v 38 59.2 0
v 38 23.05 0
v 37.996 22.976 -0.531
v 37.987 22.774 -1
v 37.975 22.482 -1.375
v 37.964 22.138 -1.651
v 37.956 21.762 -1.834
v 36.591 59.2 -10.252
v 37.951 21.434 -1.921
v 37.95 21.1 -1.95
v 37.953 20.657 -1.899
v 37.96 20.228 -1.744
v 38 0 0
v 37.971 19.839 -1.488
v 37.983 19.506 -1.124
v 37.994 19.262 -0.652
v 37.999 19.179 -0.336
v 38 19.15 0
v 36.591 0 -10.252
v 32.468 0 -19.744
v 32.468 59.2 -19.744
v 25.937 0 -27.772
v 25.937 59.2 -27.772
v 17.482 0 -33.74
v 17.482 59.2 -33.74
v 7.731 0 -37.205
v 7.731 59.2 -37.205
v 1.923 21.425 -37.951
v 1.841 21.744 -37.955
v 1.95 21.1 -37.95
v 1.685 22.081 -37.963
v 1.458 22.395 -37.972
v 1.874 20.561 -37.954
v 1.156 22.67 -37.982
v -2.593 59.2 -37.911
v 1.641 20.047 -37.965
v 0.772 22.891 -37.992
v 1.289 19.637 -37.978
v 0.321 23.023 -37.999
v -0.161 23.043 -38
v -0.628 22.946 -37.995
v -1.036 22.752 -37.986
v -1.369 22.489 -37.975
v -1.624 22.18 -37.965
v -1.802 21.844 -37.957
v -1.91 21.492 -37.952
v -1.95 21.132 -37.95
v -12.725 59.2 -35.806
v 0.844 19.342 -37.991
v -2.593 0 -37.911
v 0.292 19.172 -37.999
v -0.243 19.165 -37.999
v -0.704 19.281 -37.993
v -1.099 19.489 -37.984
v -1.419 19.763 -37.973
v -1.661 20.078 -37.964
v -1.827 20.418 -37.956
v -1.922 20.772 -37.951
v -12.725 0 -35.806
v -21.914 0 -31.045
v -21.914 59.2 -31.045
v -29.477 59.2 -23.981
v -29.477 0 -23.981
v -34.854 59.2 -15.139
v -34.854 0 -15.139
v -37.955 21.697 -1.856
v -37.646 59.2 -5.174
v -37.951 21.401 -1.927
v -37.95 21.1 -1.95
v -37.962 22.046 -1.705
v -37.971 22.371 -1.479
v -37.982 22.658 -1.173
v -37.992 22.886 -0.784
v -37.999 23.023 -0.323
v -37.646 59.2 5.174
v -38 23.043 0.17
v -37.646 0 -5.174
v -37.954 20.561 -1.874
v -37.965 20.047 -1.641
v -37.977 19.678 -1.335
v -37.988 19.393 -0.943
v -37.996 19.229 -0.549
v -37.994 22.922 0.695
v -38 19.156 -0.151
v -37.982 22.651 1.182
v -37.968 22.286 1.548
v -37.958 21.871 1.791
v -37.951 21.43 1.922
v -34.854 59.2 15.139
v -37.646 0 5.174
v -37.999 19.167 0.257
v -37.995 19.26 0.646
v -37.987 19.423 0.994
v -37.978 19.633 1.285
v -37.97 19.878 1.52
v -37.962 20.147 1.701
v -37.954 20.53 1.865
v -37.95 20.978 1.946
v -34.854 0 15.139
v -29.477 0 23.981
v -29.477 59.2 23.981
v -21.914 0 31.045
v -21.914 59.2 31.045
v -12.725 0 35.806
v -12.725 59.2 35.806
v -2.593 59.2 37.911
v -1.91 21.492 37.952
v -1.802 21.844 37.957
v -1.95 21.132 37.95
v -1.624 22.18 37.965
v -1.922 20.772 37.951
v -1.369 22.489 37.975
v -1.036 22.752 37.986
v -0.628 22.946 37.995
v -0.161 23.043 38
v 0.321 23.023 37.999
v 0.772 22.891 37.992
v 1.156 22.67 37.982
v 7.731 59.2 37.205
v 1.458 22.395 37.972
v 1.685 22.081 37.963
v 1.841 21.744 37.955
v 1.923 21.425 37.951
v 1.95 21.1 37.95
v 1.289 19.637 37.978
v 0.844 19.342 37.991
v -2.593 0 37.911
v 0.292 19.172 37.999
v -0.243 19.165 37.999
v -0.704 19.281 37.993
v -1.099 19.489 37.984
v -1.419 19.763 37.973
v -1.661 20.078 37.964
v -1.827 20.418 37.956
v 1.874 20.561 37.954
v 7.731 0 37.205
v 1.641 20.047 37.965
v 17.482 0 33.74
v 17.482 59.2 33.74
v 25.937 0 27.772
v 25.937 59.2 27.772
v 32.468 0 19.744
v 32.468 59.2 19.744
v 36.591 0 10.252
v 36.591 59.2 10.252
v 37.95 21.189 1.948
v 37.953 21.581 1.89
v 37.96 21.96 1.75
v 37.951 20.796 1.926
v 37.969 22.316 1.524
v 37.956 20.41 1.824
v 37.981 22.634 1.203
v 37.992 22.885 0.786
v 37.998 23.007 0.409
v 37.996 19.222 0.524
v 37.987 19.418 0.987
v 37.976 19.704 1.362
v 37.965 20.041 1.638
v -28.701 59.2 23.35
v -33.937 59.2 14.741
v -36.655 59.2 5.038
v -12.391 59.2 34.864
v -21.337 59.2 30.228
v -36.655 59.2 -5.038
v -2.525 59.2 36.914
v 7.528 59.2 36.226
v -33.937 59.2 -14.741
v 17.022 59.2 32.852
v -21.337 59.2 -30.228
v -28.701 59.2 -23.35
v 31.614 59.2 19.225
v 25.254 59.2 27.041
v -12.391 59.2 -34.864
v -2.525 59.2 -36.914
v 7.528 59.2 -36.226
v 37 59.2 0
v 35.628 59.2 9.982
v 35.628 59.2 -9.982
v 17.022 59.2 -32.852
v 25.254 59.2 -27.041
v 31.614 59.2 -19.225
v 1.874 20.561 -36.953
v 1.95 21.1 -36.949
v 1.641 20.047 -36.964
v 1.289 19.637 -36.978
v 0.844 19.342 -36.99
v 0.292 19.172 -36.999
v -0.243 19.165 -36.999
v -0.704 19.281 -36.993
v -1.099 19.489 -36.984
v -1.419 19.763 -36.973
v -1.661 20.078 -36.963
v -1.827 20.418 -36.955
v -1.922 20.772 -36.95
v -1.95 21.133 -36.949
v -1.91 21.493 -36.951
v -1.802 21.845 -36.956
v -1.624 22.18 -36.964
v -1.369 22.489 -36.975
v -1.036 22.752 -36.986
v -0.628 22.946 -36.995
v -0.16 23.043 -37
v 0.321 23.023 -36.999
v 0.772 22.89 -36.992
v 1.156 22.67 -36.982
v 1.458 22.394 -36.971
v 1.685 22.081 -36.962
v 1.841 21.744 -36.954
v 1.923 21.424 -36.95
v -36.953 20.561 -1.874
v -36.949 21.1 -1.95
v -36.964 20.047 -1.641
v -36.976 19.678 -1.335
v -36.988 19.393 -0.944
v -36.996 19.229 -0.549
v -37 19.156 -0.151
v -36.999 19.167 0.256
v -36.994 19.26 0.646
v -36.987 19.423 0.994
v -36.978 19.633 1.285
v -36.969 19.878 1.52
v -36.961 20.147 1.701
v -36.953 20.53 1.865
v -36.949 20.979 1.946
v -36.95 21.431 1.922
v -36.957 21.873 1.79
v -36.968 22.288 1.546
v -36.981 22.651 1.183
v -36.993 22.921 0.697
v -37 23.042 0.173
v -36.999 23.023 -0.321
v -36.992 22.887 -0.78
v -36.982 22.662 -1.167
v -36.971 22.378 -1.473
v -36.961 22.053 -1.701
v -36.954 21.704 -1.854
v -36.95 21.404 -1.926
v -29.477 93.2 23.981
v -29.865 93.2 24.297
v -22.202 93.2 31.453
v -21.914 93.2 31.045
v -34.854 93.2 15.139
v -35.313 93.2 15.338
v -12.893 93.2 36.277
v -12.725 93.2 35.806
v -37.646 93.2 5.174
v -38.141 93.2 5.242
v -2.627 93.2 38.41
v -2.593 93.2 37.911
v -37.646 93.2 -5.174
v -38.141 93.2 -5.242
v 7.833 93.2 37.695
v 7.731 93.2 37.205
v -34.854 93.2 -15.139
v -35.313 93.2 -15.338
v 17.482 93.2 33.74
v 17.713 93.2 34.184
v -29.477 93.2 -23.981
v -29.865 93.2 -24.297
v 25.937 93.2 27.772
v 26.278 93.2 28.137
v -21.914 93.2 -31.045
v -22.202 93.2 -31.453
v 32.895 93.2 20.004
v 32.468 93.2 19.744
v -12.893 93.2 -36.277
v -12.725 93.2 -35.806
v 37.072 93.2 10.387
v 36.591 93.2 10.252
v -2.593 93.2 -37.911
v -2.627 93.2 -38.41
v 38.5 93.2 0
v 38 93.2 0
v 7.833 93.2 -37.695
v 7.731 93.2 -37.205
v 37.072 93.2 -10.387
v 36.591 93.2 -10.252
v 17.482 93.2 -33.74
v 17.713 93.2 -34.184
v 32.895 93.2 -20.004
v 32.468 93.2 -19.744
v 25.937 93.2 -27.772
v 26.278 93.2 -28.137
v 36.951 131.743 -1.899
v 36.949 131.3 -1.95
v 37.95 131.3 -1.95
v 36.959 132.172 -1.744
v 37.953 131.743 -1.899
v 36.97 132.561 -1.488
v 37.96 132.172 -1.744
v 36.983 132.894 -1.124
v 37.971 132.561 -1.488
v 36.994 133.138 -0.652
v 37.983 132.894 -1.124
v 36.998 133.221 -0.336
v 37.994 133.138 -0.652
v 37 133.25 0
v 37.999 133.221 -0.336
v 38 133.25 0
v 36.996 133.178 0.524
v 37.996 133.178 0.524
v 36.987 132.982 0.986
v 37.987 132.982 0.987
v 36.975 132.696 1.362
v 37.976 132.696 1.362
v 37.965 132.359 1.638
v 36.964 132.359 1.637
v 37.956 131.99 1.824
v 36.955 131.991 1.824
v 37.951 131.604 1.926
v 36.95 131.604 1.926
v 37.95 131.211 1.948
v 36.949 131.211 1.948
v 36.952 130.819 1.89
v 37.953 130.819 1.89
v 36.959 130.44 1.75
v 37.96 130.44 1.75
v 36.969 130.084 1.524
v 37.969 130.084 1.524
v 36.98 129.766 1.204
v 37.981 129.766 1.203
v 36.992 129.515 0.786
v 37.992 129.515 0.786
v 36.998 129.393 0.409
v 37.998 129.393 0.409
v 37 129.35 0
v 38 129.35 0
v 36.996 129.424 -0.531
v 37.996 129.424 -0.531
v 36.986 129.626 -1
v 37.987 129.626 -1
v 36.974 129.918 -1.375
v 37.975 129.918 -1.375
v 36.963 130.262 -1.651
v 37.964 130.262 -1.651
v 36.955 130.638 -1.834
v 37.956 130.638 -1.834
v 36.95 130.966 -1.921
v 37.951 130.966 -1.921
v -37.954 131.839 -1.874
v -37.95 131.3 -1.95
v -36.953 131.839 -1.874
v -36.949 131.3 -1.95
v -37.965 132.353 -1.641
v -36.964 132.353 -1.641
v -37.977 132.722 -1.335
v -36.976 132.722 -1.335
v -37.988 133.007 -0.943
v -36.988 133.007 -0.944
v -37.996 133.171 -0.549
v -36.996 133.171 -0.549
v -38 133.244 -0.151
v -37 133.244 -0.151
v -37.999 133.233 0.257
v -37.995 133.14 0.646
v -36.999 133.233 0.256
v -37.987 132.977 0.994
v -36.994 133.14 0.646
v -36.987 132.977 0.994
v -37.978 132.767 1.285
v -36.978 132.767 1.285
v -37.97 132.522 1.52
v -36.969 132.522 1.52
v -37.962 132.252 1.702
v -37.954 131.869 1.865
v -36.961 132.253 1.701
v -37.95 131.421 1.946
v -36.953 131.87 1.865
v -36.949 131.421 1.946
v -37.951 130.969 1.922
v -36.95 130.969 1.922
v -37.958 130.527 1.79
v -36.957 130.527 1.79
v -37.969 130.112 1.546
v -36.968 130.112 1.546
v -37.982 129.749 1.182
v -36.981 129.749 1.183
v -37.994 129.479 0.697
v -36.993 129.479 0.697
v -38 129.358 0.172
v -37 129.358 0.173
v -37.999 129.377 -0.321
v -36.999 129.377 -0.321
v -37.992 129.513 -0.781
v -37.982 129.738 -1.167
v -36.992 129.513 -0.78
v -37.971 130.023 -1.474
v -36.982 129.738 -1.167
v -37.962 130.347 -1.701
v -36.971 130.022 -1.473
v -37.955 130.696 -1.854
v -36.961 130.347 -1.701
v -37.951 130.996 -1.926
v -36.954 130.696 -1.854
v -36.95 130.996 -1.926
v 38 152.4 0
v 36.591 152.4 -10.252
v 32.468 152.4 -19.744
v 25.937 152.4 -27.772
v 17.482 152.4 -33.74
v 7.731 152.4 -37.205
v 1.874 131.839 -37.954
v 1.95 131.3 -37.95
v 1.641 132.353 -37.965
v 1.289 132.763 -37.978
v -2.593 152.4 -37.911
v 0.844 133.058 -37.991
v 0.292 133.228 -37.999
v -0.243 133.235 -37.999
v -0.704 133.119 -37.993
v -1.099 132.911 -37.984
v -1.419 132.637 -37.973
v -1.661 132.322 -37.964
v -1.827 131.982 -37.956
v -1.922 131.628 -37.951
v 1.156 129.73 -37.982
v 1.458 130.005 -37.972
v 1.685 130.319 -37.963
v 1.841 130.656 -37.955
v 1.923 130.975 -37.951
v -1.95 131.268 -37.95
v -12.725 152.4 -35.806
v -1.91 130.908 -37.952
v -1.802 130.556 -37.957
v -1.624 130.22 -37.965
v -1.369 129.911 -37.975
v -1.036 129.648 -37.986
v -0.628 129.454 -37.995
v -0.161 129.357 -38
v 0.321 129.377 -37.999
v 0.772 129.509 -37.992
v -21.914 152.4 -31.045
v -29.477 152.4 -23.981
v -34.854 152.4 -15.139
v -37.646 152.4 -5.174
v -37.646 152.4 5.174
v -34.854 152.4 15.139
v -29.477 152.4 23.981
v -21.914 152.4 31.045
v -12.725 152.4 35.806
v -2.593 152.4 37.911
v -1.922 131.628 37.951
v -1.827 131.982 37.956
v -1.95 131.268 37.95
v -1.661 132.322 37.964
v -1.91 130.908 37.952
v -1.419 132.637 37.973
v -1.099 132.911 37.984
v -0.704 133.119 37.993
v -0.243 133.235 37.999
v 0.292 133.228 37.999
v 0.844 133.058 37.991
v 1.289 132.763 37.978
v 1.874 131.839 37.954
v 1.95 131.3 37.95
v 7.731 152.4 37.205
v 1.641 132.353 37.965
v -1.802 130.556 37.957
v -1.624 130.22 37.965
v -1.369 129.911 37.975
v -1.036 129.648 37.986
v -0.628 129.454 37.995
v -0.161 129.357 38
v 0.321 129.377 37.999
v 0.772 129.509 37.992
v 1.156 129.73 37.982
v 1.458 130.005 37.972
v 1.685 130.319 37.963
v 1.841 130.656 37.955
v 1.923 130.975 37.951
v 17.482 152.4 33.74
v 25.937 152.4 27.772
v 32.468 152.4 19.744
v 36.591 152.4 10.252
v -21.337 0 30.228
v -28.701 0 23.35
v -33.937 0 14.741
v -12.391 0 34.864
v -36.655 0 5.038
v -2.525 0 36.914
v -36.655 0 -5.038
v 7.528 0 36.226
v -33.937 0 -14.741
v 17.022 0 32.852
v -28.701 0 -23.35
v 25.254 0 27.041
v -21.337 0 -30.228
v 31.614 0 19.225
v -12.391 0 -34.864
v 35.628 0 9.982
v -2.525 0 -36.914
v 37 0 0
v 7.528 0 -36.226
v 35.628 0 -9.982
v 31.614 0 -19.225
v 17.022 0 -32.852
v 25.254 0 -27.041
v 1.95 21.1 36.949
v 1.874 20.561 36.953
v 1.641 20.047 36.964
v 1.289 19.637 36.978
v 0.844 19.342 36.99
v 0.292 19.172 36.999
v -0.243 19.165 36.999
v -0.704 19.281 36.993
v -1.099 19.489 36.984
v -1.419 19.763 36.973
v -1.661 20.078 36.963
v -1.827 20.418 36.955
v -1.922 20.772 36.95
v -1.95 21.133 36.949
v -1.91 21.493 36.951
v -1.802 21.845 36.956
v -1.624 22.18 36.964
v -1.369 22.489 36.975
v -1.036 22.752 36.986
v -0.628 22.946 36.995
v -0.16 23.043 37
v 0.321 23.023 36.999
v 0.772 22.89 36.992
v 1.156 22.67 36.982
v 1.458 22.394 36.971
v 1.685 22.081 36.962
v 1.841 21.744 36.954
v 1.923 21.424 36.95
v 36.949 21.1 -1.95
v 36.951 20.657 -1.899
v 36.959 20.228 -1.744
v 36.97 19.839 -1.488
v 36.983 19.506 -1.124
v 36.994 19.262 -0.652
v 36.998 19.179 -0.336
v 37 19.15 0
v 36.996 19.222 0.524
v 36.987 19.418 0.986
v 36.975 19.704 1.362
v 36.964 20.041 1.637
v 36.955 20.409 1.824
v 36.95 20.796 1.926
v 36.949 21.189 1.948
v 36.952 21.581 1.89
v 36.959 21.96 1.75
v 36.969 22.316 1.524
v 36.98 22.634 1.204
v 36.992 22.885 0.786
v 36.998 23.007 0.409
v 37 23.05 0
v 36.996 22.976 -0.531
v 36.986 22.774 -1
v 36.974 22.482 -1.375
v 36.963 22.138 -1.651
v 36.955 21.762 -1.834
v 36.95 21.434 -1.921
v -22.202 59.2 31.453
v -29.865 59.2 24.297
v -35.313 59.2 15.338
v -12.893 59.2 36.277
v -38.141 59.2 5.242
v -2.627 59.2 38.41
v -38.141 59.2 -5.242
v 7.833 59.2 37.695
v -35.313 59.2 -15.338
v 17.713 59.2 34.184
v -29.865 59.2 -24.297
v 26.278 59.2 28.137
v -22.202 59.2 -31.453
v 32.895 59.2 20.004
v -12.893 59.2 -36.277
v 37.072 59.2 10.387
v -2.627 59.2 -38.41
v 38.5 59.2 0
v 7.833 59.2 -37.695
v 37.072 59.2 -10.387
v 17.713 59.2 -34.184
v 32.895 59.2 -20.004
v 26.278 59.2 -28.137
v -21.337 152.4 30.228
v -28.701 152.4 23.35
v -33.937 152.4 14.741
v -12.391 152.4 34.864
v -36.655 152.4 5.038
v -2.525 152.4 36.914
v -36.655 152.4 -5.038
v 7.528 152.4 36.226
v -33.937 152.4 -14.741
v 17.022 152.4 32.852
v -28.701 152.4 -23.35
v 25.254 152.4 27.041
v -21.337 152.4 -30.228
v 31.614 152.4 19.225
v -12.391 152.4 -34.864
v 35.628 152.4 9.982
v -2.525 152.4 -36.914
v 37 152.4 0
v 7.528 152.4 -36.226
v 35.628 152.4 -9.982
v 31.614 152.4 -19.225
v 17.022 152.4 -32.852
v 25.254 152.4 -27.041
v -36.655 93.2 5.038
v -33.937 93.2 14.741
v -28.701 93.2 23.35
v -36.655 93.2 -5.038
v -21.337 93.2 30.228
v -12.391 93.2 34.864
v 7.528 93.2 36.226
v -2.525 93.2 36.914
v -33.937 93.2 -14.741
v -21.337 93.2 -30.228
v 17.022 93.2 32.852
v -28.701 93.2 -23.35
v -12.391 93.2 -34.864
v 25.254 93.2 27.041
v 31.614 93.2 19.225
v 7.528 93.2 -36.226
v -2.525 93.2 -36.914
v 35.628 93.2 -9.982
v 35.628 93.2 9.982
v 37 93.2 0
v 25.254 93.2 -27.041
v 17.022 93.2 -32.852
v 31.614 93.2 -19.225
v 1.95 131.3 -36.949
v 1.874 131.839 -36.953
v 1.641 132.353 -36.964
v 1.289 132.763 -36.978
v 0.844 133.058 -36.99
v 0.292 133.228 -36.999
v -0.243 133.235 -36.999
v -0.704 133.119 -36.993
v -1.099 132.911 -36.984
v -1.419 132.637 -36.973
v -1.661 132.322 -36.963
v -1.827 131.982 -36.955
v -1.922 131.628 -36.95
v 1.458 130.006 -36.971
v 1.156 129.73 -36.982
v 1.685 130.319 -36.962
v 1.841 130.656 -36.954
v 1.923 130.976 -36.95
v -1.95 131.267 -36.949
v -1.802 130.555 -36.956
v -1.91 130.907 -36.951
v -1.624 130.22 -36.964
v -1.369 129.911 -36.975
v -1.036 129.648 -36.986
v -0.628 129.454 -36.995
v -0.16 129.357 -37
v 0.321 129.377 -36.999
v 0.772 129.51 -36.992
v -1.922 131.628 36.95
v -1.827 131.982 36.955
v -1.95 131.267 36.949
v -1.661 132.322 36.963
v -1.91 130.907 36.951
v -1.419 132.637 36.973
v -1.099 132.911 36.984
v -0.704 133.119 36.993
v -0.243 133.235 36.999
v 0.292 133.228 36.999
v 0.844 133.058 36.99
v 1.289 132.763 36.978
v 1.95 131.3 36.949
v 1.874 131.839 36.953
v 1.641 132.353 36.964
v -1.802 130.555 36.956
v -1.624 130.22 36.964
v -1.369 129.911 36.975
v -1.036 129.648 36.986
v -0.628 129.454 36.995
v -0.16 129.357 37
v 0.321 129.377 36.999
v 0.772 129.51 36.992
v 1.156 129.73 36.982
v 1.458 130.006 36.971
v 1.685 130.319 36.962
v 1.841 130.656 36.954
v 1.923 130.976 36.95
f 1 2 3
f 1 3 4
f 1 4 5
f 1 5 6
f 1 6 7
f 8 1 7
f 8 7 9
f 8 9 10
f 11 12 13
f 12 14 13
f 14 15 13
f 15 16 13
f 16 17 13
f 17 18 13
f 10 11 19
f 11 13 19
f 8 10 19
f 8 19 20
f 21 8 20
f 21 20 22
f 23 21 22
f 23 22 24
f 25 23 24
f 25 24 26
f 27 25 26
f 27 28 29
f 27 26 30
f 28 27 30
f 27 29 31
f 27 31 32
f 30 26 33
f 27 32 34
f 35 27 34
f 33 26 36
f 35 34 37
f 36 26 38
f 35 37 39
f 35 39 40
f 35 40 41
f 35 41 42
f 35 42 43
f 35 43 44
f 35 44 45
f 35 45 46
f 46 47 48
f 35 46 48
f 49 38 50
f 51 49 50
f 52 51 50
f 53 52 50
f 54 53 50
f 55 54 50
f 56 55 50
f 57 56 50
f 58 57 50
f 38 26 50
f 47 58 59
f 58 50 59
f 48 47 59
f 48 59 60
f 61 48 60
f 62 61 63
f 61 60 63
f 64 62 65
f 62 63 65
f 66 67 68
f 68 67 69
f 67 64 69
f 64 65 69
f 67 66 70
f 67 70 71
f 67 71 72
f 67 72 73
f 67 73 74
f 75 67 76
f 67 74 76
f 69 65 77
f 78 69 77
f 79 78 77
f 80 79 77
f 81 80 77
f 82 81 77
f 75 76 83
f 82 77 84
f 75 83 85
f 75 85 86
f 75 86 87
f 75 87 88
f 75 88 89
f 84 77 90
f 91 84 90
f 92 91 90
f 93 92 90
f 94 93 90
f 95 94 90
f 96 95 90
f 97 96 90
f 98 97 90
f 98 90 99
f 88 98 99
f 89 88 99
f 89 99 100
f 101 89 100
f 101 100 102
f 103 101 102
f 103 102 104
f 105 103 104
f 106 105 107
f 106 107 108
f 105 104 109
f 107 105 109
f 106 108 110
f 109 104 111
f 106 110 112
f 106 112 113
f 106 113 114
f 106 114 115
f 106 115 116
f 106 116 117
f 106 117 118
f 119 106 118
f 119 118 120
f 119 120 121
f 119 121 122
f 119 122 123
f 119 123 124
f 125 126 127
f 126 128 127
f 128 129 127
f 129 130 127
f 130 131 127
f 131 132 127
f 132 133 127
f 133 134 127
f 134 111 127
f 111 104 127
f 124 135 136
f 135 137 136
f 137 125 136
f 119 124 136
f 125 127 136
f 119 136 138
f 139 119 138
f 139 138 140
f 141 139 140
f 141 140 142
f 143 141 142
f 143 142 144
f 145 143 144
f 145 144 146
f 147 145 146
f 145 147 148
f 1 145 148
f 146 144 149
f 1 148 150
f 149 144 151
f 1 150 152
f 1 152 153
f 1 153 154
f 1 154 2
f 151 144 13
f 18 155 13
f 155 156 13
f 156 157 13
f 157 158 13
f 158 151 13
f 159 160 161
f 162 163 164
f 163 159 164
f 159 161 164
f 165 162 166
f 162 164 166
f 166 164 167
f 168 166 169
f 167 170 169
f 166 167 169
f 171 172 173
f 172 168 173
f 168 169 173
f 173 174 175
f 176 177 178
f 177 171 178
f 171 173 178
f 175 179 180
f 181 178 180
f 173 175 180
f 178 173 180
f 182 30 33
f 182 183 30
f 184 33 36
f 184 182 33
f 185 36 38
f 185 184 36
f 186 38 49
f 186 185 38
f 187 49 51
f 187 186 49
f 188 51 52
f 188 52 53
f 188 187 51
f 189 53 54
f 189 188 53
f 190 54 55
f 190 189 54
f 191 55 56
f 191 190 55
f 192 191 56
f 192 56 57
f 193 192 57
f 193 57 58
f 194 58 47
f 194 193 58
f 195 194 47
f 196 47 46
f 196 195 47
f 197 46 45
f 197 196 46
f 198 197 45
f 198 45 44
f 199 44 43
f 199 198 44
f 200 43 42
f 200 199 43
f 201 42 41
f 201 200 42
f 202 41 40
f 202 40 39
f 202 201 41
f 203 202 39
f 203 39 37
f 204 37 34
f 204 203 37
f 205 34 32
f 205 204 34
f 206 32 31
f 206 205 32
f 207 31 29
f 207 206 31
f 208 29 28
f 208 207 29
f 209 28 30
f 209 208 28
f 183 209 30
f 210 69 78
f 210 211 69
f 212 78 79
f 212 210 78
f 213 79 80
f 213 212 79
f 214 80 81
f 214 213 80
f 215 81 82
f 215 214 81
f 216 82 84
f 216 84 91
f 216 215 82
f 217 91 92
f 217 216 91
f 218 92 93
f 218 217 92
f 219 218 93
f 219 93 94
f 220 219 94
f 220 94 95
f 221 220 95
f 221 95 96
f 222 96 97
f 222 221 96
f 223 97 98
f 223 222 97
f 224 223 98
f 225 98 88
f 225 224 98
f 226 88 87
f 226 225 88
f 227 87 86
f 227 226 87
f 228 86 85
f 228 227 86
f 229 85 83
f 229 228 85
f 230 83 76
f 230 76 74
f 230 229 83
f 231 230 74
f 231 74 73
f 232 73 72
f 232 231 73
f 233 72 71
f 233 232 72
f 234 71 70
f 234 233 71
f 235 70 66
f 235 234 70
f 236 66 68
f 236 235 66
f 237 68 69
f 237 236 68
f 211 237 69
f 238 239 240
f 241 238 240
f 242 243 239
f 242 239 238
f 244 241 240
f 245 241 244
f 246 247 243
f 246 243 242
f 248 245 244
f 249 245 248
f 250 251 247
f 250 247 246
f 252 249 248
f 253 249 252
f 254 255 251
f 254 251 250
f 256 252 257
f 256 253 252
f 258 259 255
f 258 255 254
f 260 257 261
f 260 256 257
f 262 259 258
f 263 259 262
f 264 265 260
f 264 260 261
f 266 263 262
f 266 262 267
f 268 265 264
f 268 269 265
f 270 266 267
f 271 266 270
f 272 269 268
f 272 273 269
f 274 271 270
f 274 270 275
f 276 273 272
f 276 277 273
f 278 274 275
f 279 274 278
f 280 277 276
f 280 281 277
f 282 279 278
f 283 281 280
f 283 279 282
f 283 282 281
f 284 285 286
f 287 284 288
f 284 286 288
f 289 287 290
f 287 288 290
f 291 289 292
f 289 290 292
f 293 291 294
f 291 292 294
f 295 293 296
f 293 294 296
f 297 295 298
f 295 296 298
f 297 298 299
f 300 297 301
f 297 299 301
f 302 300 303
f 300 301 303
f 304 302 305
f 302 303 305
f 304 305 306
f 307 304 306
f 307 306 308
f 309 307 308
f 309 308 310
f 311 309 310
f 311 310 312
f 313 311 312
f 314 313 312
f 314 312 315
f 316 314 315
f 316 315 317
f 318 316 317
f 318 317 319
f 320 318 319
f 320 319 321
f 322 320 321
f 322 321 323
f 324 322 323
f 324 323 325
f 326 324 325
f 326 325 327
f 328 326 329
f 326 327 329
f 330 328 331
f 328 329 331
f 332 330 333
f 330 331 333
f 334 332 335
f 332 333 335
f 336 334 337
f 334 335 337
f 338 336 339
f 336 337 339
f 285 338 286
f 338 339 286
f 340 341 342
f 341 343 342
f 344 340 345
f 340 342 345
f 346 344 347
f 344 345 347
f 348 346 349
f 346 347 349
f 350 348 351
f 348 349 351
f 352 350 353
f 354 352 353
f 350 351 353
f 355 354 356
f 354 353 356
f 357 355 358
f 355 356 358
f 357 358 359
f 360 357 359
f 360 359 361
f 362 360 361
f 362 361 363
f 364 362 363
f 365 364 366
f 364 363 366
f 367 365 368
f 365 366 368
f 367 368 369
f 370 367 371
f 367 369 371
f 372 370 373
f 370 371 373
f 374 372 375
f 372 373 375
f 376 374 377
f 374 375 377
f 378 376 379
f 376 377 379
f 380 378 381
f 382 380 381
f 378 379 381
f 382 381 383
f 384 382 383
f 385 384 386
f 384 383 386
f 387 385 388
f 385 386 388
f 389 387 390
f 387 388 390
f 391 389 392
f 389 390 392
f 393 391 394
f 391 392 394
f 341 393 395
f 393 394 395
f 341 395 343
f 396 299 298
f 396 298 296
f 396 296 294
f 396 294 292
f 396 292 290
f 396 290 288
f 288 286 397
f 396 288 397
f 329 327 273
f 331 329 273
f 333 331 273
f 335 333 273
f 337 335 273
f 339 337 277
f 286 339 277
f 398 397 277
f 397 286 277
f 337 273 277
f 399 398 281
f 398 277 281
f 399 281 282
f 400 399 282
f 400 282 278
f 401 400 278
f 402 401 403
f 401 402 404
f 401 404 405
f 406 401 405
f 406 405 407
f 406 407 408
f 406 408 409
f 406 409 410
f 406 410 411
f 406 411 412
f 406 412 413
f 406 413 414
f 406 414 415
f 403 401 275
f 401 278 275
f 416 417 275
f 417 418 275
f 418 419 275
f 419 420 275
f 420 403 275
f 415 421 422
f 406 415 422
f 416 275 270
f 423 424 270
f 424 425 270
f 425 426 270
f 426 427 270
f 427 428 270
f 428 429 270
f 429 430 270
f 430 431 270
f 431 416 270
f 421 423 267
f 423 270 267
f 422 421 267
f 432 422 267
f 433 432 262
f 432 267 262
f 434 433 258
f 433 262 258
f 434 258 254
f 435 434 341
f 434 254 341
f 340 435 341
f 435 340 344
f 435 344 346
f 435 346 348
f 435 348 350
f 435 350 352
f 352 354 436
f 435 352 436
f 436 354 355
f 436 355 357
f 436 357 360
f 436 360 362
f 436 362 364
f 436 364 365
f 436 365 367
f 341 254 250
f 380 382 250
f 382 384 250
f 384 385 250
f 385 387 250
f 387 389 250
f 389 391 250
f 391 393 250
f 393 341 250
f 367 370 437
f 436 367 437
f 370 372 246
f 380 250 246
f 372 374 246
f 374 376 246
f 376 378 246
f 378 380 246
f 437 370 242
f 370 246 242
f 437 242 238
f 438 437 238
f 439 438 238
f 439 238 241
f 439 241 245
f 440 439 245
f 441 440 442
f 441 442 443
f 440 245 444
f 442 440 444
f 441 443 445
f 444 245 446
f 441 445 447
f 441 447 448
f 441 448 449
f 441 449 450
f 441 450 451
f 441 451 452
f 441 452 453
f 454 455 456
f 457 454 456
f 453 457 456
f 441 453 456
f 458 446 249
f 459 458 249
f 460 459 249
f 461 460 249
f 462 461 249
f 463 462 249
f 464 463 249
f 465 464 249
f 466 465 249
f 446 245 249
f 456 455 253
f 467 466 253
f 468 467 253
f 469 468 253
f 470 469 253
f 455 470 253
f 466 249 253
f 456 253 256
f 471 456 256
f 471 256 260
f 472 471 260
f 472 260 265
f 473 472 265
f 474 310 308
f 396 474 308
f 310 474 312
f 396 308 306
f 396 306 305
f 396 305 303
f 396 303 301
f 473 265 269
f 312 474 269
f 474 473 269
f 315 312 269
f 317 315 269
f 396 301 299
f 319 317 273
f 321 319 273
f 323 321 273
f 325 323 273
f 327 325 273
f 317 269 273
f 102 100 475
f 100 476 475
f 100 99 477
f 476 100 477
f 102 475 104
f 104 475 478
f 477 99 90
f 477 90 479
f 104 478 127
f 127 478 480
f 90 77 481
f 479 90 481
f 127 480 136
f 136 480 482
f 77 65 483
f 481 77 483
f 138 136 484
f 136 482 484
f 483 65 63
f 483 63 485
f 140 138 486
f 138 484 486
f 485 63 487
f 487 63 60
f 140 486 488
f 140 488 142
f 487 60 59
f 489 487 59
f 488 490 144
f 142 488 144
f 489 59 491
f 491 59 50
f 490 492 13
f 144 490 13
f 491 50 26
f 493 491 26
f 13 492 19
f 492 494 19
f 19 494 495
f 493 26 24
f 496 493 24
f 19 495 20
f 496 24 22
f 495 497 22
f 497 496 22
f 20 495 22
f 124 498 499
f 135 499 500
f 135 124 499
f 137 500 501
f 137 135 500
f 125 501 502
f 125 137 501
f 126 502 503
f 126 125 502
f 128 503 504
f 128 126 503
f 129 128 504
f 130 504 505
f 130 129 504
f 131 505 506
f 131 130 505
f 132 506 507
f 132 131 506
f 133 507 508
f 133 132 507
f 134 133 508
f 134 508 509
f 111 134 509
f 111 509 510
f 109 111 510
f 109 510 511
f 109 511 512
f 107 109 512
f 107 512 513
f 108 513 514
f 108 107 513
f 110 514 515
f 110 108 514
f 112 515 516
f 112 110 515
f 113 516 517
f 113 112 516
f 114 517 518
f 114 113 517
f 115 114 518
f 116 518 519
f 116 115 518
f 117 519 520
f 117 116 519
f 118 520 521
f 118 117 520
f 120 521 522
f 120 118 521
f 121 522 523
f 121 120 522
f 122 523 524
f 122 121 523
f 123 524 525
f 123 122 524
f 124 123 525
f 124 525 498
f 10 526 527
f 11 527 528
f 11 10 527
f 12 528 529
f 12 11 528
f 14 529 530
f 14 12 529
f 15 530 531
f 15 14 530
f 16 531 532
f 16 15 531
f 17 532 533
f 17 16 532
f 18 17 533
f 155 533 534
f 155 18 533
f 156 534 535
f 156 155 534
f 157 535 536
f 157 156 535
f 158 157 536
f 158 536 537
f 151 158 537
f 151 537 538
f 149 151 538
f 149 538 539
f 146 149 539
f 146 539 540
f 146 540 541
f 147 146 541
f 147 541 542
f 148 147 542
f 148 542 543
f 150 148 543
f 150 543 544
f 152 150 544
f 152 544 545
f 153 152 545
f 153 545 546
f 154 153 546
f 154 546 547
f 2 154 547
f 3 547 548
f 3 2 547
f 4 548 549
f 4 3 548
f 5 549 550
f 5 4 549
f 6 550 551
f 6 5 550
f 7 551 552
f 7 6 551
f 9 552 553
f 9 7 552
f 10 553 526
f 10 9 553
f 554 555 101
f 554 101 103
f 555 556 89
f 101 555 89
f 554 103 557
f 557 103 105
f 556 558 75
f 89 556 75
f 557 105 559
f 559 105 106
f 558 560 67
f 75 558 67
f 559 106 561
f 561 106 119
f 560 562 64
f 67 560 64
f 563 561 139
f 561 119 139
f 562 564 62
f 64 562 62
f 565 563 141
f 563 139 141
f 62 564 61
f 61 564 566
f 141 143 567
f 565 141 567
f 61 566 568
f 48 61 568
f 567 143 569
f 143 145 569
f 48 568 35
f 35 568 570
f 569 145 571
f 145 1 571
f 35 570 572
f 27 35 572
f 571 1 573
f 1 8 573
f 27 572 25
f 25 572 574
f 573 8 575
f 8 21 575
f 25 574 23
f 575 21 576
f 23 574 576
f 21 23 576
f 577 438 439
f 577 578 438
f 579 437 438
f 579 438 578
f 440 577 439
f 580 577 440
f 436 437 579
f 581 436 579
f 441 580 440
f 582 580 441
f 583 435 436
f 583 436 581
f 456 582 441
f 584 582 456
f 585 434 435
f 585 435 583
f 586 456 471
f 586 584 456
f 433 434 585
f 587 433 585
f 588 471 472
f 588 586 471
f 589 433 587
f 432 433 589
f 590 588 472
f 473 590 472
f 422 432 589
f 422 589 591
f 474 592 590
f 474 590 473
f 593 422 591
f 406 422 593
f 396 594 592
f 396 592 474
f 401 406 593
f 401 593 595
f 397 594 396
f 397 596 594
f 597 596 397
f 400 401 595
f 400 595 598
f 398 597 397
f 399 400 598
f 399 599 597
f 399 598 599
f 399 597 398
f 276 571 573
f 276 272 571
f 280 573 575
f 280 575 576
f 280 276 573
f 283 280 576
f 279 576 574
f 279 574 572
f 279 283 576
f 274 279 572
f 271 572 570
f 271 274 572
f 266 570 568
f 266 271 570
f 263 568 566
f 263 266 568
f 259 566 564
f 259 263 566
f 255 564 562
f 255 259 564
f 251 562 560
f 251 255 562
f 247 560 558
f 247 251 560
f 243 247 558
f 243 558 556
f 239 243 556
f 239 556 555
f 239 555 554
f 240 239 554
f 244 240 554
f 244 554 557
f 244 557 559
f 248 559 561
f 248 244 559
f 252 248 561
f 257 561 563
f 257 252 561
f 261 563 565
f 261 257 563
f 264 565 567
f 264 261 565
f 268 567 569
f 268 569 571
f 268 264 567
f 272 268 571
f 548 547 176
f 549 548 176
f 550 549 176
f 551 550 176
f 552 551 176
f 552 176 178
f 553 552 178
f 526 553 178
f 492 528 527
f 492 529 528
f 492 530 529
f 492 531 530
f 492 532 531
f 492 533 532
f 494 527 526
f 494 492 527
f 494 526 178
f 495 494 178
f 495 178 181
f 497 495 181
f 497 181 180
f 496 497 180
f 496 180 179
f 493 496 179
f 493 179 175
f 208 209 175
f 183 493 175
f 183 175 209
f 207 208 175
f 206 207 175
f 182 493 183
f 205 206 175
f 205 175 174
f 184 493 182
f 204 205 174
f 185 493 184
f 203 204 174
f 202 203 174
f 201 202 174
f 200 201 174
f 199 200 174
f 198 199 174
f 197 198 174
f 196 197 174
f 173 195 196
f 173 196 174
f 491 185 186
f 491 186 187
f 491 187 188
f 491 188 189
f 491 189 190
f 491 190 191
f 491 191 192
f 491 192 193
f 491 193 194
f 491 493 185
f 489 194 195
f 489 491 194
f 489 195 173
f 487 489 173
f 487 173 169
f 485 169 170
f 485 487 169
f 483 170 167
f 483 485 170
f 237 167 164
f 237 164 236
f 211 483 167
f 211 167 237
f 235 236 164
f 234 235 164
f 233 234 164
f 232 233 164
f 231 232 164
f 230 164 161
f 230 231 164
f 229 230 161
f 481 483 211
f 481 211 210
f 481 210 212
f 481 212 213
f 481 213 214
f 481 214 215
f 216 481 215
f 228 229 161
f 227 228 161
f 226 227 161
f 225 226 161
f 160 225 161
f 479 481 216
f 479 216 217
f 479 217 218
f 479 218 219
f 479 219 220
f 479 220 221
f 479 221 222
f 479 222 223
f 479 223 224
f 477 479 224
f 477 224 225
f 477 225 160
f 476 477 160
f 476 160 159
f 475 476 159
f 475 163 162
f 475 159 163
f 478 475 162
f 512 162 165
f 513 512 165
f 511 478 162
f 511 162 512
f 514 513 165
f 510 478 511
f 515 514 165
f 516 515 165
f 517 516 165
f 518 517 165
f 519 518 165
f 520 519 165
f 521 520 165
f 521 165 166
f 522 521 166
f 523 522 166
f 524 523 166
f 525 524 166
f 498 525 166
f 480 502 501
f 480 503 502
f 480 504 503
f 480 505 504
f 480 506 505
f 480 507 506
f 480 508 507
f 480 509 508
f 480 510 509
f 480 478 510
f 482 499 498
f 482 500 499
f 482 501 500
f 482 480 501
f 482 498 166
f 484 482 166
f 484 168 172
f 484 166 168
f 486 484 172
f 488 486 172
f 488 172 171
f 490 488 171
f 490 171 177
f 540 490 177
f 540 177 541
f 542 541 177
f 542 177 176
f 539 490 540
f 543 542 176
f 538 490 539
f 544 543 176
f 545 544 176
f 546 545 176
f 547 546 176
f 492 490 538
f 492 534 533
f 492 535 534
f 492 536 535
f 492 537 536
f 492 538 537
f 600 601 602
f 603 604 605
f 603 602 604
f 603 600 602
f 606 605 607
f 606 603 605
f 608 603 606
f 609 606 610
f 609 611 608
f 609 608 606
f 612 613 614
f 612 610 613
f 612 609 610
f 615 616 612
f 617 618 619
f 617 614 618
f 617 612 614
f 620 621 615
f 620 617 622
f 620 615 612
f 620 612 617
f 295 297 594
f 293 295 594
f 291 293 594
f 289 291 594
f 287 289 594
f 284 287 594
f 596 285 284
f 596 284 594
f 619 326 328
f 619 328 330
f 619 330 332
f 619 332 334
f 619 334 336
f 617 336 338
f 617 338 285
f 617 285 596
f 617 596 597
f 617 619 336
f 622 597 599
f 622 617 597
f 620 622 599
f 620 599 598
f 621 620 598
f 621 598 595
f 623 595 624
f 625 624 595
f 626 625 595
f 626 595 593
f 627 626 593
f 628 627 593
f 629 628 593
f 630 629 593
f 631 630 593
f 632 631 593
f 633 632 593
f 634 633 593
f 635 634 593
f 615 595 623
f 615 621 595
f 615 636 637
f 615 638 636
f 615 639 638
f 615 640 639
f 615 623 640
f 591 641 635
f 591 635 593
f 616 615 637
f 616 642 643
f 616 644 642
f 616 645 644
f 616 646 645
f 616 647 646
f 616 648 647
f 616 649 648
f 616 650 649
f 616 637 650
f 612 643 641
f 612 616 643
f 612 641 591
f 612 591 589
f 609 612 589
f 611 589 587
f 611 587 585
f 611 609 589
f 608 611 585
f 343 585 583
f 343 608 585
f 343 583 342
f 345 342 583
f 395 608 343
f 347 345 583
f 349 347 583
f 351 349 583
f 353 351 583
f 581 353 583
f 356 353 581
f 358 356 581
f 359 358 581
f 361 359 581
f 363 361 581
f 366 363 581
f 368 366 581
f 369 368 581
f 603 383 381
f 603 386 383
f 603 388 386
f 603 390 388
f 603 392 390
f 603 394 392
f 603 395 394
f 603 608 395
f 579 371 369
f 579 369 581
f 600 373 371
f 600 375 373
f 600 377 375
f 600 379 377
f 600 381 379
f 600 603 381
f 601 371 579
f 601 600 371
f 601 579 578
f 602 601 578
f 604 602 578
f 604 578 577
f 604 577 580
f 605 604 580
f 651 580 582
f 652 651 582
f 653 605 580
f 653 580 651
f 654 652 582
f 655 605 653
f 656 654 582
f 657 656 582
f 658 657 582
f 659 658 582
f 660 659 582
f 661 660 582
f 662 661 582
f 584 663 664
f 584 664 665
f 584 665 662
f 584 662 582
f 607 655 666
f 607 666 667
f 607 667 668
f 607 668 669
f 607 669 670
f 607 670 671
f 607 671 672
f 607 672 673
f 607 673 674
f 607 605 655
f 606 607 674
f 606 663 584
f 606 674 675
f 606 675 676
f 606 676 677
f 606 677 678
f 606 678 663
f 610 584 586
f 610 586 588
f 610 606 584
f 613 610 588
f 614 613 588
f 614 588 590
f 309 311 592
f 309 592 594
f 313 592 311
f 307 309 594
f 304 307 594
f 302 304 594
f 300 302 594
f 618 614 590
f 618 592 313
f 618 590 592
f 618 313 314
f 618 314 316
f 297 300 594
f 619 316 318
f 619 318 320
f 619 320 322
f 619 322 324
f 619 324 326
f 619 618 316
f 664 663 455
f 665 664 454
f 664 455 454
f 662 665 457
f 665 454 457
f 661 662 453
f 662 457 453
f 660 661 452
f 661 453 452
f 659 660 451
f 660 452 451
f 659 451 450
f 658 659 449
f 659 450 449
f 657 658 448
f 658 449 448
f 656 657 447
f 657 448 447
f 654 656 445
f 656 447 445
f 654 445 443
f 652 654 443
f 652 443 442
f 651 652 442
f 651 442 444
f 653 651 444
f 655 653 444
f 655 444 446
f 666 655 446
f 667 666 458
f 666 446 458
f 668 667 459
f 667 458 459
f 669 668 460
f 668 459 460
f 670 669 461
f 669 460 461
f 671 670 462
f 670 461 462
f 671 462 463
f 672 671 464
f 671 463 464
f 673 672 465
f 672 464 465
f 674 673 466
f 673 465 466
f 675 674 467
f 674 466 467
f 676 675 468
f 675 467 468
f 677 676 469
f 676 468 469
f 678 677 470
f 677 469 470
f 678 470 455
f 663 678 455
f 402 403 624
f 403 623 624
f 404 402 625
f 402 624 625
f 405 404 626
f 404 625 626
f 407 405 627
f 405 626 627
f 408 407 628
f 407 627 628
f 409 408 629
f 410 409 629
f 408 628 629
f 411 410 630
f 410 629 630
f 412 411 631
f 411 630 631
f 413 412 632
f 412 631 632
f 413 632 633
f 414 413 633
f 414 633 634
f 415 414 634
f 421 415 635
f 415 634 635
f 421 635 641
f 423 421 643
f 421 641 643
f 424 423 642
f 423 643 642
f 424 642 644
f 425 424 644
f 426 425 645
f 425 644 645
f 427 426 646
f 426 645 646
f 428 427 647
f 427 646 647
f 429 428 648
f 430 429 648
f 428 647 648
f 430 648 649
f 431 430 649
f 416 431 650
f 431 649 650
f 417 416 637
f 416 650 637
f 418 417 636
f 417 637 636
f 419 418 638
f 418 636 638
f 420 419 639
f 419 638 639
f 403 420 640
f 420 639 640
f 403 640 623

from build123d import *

# Parameters (mm, degrees)
SKETCH1_R                = 38
SKETCH1_R_2              = 37
BOSS_EXTRUDE1_DEPTH      = 152.4
SKETCH2_R                = 38.5
BOSS_EXTRUDE2_DEPTH      = 17
BOSS_EXTRUDE2_DEPTH_BACK = 17
SKETCH3_R                = 1.95
CUT_EXTRUDE1_DEPTH       = 39.5
SKETCH4_R                = 1.95
CUT_EXTRUDE2_DEPTH       = 39.5


with BuildPart() as part:
    # Sketch1 → Boss-Extrude1 (new body)
    with BuildSketch(Plane(origin=(0, 0, 0), x_dir=(1, 0, 0), z_dir=(0, 1, 0))):
        Circle(SKETCH1_R)
        Circle(SKETCH1_R_2, mode=Mode.SUBTRACT)
    extrude(amount=BOSS_EXTRUDE1_DEPTH)

    # Sketch2 → Boss-Extrude2 (add, two sides)
    with BuildSketch(Plane(origin=(0, 76.2, 0), x_dir=(1, 0, 0), z_dir=(0, 1, 0))) as boss_extrude2_sk:
        Circle(SKETCH2_R)
    extrude(amount=BOSS_EXTRUDE2_DEPTH)
    extrude(boss_extrude2_sk.sketch, amount=-BOSS_EXTRUDE2_DEPTH_BACK)

    # Sketch3 → Cut-Extrude1 (cut, symmetric)
    with BuildSketch(Plane(origin=(0, 0, 0), x_dir=(0, 0, -1), z_dir=(1, 0, 0))):
        with Locations((0, 131.3)):
            Circle(SKETCH3_R)
    cut_extrude1 = extrude(amount=CUT_EXTRUDE1_DEPTH, both=True, mode=Mode.SUBTRACT)

    # Sketch4 → Cut-Extrude2 (cut, symmetric)
    with BuildSketch(Plane.XY):
        with Locations((0, 131.3)):
            Circle(SKETCH4_R)
    cut_extrude2 = extrude(amount=CUT_EXTRUDE2_DEPTH, both=True, mode=Mode.SUBTRACT)

    # Mirror1: Cut-Extrude1, Cut-Extrude2 across plane
    add(cut_extrude1.mirror(Plane.ZX.offset(76.2)), mode=Mode.SUBTRACT)
    add(cut_extrude2.mirror(Plane.ZX.offset(76.2)), mode=Mode.SUBTRACT)


solid = part.part
